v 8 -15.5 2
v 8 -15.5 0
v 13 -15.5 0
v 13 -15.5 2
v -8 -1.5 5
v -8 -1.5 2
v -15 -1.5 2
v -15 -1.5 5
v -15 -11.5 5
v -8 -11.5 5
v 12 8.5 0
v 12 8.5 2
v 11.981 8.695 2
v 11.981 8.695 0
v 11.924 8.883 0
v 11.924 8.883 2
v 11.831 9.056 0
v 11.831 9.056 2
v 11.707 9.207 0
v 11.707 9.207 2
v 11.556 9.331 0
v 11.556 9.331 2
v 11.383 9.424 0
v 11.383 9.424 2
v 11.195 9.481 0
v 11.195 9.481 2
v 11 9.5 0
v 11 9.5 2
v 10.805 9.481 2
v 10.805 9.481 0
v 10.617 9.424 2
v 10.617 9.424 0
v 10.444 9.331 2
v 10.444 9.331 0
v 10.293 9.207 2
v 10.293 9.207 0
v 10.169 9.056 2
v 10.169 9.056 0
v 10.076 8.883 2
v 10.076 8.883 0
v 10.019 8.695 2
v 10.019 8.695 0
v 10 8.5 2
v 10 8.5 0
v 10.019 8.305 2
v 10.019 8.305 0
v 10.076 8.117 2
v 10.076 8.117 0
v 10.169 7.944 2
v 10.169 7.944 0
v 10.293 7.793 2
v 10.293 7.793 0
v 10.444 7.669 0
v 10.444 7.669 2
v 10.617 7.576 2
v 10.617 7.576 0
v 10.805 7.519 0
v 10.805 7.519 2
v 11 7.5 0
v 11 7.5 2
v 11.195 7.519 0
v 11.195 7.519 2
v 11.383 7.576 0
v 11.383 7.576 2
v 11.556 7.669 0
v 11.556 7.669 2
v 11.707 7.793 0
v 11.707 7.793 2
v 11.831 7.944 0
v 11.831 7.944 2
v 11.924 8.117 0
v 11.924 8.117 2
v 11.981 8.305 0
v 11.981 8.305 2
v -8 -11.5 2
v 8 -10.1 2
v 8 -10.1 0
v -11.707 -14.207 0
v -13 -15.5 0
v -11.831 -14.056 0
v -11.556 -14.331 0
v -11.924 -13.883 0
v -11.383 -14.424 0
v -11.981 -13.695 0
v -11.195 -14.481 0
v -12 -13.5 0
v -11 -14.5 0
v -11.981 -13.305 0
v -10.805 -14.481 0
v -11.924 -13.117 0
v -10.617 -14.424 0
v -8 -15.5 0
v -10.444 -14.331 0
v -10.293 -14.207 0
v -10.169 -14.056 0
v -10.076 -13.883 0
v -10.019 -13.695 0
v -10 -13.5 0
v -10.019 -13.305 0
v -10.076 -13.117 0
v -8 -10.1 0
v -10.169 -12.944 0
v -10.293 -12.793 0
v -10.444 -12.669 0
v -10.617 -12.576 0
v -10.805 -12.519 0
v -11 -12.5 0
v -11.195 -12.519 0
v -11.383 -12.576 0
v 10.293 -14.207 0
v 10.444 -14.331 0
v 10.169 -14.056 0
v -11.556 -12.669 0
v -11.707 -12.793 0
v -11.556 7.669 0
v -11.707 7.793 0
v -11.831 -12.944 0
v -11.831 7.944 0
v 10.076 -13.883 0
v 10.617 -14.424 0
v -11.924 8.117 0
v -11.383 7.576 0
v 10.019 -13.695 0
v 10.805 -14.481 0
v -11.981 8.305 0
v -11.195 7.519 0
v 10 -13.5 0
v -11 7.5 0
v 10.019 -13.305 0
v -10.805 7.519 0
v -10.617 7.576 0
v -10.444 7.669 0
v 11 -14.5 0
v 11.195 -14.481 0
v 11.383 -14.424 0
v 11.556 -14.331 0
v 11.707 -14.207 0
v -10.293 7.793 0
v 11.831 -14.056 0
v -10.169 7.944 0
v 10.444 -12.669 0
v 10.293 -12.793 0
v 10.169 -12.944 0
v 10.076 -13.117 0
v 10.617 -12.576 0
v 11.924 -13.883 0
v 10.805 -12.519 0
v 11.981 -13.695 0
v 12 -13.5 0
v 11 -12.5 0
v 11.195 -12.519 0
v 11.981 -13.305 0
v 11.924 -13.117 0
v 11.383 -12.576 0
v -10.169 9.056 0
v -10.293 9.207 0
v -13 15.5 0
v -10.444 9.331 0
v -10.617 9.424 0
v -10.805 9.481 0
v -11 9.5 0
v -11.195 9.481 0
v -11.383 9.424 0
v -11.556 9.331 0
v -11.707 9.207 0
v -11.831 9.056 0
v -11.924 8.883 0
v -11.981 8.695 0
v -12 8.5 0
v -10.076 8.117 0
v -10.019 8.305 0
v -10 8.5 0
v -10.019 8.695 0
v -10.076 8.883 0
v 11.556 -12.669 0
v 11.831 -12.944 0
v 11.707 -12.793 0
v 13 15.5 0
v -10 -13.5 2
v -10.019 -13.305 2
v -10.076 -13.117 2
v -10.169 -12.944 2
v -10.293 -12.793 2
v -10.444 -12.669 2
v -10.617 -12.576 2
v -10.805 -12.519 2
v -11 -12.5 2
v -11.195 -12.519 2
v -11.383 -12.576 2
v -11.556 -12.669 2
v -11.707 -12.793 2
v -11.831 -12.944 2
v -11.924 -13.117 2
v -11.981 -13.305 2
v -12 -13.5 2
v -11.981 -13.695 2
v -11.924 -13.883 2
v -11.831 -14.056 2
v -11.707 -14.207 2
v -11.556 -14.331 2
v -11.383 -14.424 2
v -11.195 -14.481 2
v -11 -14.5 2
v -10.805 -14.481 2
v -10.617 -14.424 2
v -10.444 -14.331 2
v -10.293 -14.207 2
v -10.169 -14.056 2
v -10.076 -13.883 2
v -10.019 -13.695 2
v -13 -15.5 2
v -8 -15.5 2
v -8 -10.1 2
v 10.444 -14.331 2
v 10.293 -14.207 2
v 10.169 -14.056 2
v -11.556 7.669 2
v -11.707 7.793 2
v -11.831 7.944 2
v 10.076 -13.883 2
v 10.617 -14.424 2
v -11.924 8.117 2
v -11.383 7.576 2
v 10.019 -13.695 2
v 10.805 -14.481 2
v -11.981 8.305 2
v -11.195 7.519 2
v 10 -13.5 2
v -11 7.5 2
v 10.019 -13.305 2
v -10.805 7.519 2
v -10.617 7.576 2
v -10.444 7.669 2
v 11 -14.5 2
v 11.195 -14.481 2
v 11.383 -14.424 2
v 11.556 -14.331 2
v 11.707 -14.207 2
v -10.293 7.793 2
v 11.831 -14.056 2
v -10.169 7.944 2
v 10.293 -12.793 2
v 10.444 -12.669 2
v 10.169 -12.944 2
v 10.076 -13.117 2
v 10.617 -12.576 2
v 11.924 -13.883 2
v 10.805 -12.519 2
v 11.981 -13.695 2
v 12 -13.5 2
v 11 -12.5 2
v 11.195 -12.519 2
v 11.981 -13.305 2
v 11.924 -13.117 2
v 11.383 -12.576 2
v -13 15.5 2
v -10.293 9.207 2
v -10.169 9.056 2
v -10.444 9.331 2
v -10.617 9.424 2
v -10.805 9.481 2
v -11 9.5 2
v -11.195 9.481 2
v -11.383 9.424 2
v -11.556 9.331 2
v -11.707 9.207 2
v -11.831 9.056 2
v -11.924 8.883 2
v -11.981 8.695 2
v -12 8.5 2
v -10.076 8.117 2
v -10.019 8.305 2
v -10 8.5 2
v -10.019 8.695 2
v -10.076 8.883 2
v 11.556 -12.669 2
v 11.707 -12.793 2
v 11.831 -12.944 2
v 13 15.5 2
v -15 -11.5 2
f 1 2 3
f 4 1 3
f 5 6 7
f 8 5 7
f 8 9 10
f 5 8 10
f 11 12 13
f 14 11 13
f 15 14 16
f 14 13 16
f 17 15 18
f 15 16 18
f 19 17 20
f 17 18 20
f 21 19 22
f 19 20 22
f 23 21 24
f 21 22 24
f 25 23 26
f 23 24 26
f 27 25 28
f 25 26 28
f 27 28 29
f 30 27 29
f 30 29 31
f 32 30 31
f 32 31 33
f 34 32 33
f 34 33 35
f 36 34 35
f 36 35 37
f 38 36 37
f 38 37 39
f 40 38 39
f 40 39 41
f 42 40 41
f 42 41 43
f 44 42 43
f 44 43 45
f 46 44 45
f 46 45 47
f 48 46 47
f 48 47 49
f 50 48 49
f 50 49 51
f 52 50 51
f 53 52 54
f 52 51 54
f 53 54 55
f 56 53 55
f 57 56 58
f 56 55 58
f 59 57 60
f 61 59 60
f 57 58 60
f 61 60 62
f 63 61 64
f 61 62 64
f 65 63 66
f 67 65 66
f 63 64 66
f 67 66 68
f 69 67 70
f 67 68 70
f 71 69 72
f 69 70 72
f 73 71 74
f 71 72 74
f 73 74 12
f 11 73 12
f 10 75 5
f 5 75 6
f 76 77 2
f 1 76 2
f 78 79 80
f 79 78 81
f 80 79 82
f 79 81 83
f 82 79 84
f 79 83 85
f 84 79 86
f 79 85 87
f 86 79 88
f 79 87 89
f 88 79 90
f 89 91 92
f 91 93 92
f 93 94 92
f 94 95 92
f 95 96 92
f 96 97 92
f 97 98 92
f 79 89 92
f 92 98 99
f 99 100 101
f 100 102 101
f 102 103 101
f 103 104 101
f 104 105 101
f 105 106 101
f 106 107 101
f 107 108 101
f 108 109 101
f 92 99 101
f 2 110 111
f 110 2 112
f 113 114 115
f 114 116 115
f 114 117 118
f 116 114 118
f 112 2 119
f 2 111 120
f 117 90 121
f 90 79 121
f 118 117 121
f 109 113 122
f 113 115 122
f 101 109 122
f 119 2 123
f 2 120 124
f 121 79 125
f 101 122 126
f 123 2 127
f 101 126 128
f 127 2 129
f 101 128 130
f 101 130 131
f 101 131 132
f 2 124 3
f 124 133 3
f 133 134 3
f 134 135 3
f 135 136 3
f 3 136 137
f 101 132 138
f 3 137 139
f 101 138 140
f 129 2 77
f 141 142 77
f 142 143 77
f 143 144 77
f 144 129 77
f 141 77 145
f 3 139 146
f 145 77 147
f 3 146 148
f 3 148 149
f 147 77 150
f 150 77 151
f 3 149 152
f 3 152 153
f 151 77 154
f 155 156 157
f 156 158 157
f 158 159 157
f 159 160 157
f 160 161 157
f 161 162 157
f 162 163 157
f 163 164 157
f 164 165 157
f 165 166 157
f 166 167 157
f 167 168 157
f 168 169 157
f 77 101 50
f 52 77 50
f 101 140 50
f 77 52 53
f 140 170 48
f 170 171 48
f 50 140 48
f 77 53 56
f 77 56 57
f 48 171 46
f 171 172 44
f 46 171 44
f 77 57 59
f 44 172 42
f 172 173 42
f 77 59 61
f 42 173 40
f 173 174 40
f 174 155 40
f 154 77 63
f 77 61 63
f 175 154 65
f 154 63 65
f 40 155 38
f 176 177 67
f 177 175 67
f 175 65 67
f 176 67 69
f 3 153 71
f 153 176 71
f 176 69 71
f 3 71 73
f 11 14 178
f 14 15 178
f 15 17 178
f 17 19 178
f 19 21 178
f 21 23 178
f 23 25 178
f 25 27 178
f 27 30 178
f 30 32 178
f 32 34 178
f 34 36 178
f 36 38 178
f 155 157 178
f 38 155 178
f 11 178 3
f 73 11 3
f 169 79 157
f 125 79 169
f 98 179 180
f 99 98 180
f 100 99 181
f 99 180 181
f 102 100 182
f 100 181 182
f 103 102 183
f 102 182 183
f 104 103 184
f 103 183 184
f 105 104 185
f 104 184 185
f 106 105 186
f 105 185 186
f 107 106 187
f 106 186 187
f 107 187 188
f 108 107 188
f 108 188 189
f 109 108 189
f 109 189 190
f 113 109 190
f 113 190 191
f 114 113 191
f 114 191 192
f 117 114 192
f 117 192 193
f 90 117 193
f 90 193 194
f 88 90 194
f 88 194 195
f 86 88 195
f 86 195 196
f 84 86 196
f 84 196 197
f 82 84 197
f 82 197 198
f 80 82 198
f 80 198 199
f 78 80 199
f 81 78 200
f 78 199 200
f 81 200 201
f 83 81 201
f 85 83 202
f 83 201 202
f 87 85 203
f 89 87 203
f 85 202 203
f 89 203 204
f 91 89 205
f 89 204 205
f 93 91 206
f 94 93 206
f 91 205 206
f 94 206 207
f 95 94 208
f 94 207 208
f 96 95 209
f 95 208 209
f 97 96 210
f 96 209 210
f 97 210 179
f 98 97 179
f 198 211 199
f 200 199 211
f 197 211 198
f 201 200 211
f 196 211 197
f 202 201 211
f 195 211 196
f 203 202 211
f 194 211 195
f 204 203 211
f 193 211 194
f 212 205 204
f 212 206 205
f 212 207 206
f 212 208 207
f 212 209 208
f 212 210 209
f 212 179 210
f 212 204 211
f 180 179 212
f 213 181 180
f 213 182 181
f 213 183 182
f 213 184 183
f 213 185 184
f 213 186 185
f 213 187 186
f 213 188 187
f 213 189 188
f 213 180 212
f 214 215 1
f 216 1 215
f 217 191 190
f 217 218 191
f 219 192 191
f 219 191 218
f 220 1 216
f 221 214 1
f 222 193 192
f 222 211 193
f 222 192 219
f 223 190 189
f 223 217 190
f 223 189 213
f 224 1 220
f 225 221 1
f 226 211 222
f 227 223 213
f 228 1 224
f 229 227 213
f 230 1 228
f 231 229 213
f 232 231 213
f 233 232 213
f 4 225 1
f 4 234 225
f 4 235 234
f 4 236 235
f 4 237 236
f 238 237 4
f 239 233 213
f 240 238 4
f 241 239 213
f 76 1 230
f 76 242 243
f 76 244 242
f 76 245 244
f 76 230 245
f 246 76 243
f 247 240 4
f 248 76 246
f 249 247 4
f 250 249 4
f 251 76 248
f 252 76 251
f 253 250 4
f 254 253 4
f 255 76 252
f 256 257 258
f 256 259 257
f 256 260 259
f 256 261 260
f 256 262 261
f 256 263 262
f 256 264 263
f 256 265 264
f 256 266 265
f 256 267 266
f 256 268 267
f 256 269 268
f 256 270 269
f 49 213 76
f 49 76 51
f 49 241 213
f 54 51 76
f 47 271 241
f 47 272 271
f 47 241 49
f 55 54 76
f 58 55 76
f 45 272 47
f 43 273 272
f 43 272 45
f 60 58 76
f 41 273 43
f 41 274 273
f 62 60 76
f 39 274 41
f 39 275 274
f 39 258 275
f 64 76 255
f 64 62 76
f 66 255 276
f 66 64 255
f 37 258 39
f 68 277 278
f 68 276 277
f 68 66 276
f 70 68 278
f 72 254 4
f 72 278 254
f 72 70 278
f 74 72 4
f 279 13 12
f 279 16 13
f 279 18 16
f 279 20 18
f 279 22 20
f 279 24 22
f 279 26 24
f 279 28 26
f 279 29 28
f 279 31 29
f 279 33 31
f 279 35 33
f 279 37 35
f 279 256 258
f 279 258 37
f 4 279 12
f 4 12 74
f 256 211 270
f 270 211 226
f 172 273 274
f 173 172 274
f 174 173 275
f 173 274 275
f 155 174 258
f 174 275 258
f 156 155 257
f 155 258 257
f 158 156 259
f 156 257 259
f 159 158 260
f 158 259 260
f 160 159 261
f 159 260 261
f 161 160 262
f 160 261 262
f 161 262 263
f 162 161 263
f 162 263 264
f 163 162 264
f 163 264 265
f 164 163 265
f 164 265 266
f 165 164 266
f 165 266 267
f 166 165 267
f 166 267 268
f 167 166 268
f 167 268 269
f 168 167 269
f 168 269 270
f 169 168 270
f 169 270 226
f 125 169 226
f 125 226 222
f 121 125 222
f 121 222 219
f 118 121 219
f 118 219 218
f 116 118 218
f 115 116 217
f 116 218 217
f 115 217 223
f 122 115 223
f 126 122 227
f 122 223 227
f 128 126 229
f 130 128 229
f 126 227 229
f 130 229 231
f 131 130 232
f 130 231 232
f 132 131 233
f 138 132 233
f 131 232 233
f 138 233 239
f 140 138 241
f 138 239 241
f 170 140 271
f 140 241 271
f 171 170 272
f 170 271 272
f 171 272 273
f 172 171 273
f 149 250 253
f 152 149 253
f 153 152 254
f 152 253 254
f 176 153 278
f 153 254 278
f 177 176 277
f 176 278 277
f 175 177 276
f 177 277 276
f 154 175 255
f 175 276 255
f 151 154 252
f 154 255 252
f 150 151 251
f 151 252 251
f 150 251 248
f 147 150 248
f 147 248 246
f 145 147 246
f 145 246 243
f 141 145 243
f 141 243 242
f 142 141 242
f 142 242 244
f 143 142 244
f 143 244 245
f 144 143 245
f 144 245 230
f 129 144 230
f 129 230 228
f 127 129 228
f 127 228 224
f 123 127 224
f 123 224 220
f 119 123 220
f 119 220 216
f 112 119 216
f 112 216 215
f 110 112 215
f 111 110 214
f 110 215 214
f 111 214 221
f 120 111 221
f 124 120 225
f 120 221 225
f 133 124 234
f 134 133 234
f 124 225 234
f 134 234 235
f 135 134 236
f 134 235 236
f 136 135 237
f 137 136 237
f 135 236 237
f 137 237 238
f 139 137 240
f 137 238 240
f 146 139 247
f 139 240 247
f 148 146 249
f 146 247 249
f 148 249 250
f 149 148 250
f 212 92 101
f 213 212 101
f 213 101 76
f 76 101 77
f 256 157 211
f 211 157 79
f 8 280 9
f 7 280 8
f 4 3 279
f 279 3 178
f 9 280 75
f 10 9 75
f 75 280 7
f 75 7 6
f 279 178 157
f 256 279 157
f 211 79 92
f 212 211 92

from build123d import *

# Parameters (mm, degrees)
SKETCH_1_W          = 5
SKETCH_1_H          = 4
EXTRUDE_1_DEPTH     = 2
EXTRUDE_START       = 2
SKETCH_1_3_W        = 2
SKETCH_1_3_H        = 10
EXTRUDE_2_DEPTH     = 3
SKETCH_2_R          = 1
CUT_EXTRUDE_1_DEPTH = 3


with BuildPart() as part:
    # Эскиз1 → Бобышка-Вытянуть1 (new body)
    with BuildSketch(Plane.XY):
        Polygon((-8, -1.5), (-8, -10.1), (8, -10.1), (8, -15.5), (13, -15.5), (13, 15.5), (-13, 15.5), (-13, -1.5), align=None)
        Polygon((-13, -11.5), (-8, -11.5), (-8, -10.1), (-8, -1.5), (-13, -1.5), align=None)
        with Locations((-10.5, -13.5)):
            Rectangle(SKETCH_1_W, SKETCH_1_H)
    extrude(amount=EXTRUDE_1_DEPTH)

    # Эскиз2 → Вырез-Вытянуть1 (cut, through all)
    with BuildSketch(Plane.XY.offset(2)):
        with Locations((11, -13.5)):
            Circle(SKETCH_2_R)
        with Locations((-11, -13.5)):
            Circle(SKETCH_2_R)
        with Locations((11, 8.5)):
            Circle(SKETCH_2_R)
        with Locations((-11, 8.5)):
            Circle(SKETCH_2_R)
    extrude(amount=-CUT_EXTRUDE_1_DEPTH, mode=Mode.SUBTRACT)


with BuildPart() as body_2:
    # Эскиз1<3> → Бобышка-Вытянуть2 (new body)
    with BuildSketch(Plane.XY.offset(EXTRUDE_START)):
        with Locations((-14, -6.5)):
            Rectangle(SKETCH_1_3_W, SKETCH_1_3_H)
        Polygon((-13, -11.5), (-8, -11.5), (-8, -10.1), (-8, -1.5), (-13, -1.5), align=None)
    extrude(amount=EXTRUDE_2_DEPTH)


solid = Compound([part.part, body_2.part])
